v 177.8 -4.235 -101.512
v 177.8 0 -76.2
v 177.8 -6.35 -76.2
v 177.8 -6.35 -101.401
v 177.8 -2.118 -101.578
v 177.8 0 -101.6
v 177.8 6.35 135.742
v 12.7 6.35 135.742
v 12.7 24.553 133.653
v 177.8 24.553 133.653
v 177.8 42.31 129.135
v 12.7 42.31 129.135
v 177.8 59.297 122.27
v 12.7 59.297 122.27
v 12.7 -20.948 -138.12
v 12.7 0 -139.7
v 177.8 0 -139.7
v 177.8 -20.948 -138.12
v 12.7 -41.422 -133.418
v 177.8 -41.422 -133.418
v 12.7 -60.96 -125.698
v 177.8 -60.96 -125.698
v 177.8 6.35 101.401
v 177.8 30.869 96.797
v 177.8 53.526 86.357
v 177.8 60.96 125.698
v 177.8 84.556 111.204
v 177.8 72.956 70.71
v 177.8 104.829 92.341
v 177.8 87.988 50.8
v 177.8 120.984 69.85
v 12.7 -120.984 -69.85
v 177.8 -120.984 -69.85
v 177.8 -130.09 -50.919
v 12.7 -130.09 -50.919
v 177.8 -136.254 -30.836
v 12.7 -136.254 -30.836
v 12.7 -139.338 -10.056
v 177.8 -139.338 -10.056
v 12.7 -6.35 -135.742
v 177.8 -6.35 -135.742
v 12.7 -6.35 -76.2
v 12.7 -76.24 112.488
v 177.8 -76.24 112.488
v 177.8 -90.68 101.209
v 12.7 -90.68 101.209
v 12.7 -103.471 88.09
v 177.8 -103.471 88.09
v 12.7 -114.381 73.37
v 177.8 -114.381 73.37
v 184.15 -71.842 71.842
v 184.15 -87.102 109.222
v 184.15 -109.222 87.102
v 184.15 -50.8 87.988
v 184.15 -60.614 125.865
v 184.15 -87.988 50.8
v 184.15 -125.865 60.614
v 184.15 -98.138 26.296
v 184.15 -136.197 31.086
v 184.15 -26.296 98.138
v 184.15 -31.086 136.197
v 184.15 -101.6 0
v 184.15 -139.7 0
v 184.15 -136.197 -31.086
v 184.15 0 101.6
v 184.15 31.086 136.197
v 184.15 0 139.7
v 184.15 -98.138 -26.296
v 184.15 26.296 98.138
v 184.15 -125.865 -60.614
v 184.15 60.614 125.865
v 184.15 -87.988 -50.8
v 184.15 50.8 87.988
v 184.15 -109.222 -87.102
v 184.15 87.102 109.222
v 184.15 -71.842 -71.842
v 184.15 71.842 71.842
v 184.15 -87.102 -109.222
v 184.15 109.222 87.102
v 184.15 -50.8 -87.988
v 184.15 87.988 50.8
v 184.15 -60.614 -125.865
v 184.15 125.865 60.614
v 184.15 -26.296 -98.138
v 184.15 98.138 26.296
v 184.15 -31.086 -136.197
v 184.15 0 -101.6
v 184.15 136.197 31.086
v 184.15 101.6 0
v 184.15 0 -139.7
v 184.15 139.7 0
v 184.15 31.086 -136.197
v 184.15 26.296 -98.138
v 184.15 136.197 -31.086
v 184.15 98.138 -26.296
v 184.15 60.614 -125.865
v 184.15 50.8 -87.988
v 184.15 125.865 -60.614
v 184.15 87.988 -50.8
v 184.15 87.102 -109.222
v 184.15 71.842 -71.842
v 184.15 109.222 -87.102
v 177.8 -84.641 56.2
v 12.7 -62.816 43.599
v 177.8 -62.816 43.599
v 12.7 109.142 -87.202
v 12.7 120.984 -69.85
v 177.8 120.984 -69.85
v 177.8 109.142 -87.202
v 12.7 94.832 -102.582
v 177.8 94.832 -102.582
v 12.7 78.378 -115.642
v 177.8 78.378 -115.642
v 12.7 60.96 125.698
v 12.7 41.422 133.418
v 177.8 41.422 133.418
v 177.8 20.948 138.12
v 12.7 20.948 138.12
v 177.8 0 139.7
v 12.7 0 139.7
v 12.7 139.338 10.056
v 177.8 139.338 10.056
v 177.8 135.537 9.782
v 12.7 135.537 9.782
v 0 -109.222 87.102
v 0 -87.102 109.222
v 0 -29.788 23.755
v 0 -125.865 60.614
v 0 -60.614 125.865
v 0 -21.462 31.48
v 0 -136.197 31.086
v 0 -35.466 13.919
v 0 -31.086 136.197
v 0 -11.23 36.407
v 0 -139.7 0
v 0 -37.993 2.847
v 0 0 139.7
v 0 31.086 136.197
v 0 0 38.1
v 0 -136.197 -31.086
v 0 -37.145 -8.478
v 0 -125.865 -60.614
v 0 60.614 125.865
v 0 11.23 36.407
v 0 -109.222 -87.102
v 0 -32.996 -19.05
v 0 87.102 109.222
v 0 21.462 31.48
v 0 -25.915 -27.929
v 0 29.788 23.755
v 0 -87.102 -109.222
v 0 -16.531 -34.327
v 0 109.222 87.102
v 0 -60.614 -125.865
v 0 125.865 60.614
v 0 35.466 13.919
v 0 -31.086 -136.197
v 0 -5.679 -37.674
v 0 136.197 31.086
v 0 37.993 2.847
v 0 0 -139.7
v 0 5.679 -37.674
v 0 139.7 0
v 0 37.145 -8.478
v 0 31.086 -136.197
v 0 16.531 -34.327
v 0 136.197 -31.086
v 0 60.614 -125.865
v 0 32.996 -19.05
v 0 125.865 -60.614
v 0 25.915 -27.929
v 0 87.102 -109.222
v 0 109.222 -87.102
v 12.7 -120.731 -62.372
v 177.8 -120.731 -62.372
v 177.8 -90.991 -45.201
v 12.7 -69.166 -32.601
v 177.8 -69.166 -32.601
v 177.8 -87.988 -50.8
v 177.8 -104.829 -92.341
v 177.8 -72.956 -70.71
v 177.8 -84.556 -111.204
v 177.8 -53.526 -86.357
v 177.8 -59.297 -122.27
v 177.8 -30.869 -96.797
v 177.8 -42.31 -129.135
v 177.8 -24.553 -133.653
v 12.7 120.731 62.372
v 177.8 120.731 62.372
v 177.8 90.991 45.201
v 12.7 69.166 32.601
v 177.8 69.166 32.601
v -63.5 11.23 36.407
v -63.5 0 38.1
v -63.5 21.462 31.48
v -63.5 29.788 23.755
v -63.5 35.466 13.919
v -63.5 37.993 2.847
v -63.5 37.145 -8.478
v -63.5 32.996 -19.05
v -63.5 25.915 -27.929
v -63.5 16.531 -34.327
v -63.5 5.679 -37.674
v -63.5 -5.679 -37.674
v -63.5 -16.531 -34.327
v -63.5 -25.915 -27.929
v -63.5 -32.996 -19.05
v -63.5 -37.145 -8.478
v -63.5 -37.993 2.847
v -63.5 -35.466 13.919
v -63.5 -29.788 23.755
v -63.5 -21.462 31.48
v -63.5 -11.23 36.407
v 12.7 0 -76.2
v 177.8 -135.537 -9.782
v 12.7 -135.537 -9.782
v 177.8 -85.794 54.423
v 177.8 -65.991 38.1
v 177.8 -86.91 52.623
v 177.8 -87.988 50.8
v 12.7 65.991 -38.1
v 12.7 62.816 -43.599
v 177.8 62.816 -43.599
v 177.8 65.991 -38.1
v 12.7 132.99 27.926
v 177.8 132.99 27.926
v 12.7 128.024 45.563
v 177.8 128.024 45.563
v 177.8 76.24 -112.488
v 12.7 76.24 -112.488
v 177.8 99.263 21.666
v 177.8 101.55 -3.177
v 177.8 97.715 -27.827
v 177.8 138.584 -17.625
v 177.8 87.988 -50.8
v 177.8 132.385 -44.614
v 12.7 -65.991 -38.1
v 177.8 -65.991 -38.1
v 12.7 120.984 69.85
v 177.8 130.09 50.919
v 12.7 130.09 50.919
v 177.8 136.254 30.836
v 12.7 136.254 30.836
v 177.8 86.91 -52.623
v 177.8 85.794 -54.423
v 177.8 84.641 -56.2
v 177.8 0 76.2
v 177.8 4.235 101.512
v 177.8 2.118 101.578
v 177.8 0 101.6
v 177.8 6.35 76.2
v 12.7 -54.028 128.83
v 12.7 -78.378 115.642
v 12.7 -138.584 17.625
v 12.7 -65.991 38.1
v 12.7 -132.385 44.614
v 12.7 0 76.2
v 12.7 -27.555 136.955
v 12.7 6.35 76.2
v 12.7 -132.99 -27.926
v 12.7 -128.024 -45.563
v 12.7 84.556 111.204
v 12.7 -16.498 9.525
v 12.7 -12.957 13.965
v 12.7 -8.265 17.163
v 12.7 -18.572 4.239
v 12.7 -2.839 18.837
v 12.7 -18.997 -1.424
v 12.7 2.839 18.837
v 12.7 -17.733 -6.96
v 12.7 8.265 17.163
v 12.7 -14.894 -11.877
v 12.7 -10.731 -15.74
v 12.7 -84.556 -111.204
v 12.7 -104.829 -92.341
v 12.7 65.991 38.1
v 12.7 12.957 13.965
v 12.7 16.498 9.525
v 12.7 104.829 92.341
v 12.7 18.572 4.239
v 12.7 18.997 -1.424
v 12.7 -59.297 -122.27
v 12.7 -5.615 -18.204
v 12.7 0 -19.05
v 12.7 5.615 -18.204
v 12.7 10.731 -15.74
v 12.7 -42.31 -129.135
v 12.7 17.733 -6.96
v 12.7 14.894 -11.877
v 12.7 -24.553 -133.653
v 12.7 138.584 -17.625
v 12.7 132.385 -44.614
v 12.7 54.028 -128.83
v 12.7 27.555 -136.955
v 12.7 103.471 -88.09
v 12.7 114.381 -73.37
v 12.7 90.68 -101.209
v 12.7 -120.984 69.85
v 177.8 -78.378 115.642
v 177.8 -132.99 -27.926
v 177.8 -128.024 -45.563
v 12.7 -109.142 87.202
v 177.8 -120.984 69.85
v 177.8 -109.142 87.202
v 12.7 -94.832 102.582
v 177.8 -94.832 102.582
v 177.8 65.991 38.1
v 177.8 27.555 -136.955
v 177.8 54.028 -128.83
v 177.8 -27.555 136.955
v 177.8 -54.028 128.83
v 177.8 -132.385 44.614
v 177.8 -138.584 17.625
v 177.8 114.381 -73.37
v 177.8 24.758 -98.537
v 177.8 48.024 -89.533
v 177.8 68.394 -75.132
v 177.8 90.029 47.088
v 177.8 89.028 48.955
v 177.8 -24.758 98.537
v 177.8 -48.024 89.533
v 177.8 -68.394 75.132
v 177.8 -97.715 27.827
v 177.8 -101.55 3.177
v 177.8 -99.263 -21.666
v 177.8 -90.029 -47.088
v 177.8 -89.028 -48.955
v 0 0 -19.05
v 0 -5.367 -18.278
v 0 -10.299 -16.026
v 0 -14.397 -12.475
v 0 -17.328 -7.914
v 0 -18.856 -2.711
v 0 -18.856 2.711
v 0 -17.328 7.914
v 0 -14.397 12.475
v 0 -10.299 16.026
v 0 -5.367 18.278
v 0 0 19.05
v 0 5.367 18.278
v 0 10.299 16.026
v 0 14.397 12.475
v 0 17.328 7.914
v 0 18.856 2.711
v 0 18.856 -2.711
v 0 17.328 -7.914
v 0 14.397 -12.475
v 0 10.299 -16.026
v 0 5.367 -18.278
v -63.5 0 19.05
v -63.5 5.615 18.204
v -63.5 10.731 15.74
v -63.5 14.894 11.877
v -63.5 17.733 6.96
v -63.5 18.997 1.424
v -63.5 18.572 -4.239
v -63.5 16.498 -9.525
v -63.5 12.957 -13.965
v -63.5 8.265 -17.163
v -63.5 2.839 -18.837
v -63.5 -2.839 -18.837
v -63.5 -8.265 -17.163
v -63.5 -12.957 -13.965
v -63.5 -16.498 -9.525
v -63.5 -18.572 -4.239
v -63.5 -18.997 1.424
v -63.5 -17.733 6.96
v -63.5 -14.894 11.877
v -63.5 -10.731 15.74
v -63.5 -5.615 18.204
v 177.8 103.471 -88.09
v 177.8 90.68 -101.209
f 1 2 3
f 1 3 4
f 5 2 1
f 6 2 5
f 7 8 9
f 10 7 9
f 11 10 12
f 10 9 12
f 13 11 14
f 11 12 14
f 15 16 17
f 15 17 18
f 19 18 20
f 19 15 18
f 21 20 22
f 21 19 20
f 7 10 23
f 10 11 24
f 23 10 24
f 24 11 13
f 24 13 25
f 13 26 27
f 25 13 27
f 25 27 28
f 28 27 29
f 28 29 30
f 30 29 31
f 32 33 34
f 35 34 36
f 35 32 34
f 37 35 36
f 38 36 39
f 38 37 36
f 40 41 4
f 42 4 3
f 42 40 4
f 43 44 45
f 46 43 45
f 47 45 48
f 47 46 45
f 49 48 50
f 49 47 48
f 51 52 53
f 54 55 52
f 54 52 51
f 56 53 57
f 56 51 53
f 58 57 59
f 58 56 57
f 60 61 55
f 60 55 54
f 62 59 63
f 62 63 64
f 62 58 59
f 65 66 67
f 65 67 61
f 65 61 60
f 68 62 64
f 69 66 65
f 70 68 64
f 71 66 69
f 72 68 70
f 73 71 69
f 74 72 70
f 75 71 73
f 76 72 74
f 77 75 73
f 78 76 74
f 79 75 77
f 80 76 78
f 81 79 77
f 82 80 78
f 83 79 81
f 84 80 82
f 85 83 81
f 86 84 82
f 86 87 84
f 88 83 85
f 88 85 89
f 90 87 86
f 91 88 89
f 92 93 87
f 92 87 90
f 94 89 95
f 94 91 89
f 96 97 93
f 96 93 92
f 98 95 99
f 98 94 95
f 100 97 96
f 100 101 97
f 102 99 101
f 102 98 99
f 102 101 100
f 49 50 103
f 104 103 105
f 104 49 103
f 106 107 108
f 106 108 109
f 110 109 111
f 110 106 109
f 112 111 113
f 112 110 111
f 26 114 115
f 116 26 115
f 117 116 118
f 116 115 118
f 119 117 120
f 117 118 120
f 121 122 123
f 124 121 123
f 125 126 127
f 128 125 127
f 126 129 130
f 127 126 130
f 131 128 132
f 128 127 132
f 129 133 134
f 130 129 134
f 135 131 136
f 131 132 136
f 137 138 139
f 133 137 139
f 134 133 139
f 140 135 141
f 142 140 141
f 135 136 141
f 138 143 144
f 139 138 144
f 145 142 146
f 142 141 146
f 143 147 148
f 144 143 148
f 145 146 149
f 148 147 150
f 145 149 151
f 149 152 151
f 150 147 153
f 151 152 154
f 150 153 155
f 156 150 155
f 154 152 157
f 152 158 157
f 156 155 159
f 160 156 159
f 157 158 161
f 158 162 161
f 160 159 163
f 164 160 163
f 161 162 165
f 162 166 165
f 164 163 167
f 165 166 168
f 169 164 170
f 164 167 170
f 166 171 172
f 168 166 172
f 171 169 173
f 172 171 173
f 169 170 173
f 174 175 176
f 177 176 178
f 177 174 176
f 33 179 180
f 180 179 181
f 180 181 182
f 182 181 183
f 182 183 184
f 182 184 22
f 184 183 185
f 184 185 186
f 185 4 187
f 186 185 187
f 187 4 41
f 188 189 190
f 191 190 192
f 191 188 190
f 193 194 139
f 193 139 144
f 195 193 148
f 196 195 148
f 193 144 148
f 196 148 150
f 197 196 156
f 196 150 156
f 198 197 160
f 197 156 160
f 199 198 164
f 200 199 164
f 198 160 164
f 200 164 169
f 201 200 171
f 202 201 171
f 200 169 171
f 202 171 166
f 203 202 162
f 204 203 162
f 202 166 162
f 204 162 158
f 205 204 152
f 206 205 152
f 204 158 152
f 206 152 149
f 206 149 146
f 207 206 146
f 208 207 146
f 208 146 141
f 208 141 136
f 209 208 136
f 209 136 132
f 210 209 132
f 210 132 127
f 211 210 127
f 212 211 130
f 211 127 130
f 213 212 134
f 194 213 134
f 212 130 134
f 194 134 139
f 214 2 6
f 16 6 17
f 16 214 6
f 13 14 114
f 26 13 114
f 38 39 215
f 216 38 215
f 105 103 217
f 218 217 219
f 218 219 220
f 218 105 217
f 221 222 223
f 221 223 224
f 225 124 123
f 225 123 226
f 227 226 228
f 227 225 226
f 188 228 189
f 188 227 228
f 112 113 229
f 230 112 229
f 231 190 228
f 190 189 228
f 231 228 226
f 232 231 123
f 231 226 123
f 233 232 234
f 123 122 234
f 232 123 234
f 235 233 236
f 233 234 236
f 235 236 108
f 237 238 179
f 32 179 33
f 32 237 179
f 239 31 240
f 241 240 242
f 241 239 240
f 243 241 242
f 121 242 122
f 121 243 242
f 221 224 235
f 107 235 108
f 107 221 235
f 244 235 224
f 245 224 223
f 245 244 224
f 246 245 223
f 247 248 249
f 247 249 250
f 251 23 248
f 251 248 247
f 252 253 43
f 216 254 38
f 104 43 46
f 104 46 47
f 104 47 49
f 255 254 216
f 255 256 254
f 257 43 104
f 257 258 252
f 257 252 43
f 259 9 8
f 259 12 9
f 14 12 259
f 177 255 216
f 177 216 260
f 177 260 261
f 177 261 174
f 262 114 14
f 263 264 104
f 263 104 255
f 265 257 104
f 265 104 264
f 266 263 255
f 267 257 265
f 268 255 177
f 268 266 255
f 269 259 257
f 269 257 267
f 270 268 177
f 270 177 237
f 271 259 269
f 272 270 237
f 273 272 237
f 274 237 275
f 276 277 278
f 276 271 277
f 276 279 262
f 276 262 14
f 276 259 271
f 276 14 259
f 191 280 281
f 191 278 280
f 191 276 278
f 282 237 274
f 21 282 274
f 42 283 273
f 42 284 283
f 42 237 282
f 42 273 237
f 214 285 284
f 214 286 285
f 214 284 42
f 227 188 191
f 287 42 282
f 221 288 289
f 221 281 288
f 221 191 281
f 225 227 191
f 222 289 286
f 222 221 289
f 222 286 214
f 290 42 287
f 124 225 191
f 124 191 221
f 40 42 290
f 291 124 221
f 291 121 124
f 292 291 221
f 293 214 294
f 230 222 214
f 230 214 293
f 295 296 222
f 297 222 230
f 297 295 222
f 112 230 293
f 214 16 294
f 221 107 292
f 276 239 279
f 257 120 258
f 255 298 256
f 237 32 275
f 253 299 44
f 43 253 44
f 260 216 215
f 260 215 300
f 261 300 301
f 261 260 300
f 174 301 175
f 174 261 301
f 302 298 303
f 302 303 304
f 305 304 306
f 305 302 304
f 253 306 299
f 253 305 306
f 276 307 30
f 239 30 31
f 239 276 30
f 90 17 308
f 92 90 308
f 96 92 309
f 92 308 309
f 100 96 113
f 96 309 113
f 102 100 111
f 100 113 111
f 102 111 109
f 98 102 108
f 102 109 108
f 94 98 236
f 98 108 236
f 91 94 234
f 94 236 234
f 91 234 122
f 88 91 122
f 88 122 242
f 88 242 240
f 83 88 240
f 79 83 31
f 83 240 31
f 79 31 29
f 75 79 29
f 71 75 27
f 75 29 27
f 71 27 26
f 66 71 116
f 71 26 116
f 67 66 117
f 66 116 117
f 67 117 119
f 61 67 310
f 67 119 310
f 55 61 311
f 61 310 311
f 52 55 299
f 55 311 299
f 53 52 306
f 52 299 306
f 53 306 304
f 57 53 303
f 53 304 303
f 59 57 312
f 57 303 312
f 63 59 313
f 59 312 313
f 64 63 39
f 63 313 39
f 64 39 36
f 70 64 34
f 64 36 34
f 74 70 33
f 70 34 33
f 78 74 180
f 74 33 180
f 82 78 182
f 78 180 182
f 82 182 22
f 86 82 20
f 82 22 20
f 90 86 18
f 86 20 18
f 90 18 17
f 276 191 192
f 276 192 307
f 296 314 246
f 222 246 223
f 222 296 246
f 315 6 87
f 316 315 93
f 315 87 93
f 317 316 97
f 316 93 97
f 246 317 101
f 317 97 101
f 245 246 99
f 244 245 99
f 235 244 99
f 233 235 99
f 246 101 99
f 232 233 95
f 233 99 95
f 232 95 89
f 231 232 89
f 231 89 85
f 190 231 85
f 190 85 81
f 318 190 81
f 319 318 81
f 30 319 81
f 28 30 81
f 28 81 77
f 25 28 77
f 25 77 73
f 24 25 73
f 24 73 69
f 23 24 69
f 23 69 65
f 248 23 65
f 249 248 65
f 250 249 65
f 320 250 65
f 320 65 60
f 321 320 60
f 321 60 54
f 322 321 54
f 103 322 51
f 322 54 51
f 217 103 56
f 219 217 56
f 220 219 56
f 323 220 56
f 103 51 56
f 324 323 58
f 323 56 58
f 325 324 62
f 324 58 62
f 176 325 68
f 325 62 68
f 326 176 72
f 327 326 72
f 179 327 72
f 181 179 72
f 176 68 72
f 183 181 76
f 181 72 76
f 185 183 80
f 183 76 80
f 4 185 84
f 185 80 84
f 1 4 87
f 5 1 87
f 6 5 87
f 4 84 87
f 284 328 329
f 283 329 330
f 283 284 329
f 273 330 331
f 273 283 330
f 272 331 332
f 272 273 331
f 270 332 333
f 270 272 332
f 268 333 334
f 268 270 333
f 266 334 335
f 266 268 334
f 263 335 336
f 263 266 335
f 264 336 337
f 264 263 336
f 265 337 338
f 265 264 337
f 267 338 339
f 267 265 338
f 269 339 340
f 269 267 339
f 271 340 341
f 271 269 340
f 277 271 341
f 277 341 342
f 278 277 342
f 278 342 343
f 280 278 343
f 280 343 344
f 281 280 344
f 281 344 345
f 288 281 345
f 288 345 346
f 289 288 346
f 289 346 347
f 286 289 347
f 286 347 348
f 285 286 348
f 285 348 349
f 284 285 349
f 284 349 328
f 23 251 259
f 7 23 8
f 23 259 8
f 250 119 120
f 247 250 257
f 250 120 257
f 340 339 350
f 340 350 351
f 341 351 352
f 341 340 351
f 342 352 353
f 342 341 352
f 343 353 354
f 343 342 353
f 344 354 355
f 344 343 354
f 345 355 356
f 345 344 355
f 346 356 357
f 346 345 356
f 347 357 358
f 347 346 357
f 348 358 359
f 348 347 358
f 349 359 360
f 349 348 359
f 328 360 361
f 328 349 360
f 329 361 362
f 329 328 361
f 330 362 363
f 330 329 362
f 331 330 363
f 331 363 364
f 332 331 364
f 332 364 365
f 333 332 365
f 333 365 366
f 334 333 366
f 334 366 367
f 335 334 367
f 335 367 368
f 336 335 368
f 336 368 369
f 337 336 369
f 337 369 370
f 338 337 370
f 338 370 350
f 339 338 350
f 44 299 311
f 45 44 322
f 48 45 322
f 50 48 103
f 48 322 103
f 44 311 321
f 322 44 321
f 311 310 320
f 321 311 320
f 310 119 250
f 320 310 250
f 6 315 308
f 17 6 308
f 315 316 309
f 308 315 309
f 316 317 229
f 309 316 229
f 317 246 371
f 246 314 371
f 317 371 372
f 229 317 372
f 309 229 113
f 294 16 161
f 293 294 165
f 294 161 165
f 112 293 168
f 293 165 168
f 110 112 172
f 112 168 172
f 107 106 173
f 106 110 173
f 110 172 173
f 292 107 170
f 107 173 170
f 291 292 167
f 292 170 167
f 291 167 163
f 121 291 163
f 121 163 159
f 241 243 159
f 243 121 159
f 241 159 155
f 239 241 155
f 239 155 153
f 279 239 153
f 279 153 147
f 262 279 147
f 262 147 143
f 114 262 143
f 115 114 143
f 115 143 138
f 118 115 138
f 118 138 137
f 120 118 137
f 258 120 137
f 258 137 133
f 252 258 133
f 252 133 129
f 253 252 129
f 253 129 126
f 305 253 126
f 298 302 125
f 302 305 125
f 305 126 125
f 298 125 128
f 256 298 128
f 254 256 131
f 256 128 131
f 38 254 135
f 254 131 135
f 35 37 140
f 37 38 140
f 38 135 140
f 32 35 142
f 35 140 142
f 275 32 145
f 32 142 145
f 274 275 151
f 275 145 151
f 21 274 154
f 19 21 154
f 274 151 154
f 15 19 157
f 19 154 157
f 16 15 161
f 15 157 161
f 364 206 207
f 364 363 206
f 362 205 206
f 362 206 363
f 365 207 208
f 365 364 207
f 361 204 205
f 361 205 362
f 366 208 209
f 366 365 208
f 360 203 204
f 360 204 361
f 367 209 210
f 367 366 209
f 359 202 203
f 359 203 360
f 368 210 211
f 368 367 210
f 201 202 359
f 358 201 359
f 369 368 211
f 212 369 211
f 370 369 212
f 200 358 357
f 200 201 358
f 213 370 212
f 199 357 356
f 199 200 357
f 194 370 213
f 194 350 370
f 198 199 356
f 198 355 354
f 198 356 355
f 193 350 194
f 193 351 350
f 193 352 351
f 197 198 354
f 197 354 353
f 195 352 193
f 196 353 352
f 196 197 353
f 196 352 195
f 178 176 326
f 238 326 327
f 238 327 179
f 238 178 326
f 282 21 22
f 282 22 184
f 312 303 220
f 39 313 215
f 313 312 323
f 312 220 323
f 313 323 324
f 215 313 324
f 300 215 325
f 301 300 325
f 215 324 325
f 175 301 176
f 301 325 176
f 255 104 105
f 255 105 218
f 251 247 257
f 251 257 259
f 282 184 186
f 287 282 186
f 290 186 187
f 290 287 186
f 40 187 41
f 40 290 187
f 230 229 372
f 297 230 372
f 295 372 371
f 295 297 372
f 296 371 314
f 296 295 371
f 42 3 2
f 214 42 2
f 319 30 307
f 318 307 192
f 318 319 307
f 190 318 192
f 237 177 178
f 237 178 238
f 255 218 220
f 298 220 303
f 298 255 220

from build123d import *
from build123d.topology import SkipClean

# Parameters (mm, degrees)
SKETCH5_R           = 139.7
BOSS_EXTRUDE3_DEPTH = 12.7
SKETCH6_R           = 38.1
SKETCH6_R_2         = 19.05
BOSS_EXTRUDE4_DEPTH = 63.5
CUT_EXTRUDE3_START  = -63.5
SKETCH7_R           = 19.05
CUT_EXTRUDE3_DEPTH  = 63.5
BOSS_EXTRUDE5_DEPTH = 165.1
SKETCH10_R          = 139.7
BOSS_EXTRUDE6_DEPTH = 6.35
SKETCH11_R          = 101.6
CUT_EXTRUDE4_DEPTH  = 6.35


with BuildPart() as part:
    # Sketch5 → Boss-Extrude3 (new body)
    with BuildSketch(Plane(origin=(0, 0, 0), x_dir=(0, 0, -1), z_dir=(1, 0, 0))):
        Circle(SKETCH5_R)
    extrude(amount=BOSS_EXTRUDE3_DEPTH)

    # Sketch6 → Boss-Extrude4 (add)
    with BuildSketch(Plane.ZY):
        Circle(SKETCH6_R)
        Circle(SKETCH6_R_2, mode=Mode.SUBTRACT)
    extrude(amount=BOSS_EXTRUDE4_DEPTH)

    # Sketch7 → Cut-Extrude3 (cut)
    with BuildSketch(Plane.ZY.offset(CUT_EXTRUDE3_START)):
        with Locations(Location((0, 0, 0), (0, 0, 180))):
            Circle(SKETCH7_R)
    extrude(amount=CUT_EXTRUDE3_DEPTH, mode=Mode.SUBTRACT)

    # Sketch9 → Boss-Extrude5 (add)
    with SkipClean():  # the faces are left unmerged after this step: merging them gives an invalid solid
        with BuildSketch(Plane(origin=(12.7, 0, 0), x_dir=(0, 0, -1), z_dir=(1, 0, 0))):
            with BuildLine():
                Line((-139.7, 0), (-76.2, 0))
                Line((-76.2, 0), (-76.2, 6.35))
                Line((-76.2, 6.35), (-135.741554433, 6.35))
                ThreePointArc((-135.741554433, 6.35), (-131.694050685, 33.507747077), (-122.269799969, 59.297454545))
                Line((-122.269799969, 59.297454545), (-125.697925202, 60.96))
                ThreePointArc((-125.697925202, 60.96), (-136.154489736, 31.2737098), (-139.7, 0))
            make_face()
            with BuildLine():
                Line((-115.641871216, -78.377596428), (-112.488002001, -76.240025616))
                ThreePointArc((-112.488002001, -76.240025616), (-94.865585535, -97.296519882), (-73.370038531, -114.380634489))
                Line((-73.370038531, -114.380634489), (-43.599261314, -62.816135768))
                Line((-43.599261314, -62.816135768), (-38.1, -65.991135768))
                Line((-38.1, -65.991135768), (-69.85, -120.983748909))
                ThreePointArc((-69.85, -120.983748909), (-95.161072026, -102.276392051), (-115.641871216, -78.377596428))
            make_face()
            with BuildLine():
                Line((10.056053986, -139.337596428), (9.781797968, -135.537480161))
                ThreePointArc((9.781797968, -135.537480161), (36.82846515, -130.804266959), (62.371515903, -120.730634489))
                Line((62.371515903, -120.730634489), (32.600738686, -69.166135768))
                Line((32.600738686, -69.166135768), (38.1, -65.991135768))
                Line((38.1, -65.991135768), (69.85, -120.983748909))
                ThreePointArc((69.85, -120.983748909), (40.993417711, -133.550101851), (10.056053986, -139.337596428))
            make_face()
            with BuildLine():
                Line((125.697925202, -60.96), (122.269799969, -59.297454545))
                ThreePointArc((122.269799969, -59.297454545), (131.694050685, -33.507747077), (135.741554433, -6.35))
                Line((135.741554433, -6.35), (76.2, -6.35))
                Line((76.2, -6.35), (76.2, 0))
                Line((76.2, 0), (139.7, 0))
                ThreePointArc((139.7, 0), (136.154489736, -31.2737098), (125.697925202, -60.96))
            make_face()
            with BuildLine():
                Line((115.641871216, 78.377596428), (112.488002001, 76.240025616))
                ThreePointArc((112.488002001, 76.240025616), (94.865585535, 97.296519882), (73.370038531, 114.380634489))
                Line((73.370038531, 114.380634489), (43.599261314, 62.816135768))
                Line((43.599261314, 62.816135768), (38.1, 65.991135768))
                Line((38.1, 65.991135768), (69.85, 120.983748909))
                ThreePointArc((69.85, 120.983748909), (95.161072026, 102.276392051), (115.641871216, 78.377596428))
            make_face()
            with BuildLine():
                Line((-10.056053986, 139.337596428), (-9.781797968, 135.537480161))
                ThreePointArc((-9.781797968, 135.537480161), (-36.82846515, 130.804266959), (-62.371515903, 120.730634489))
                Line((-62.371515903, 120.730634489), (-32.600738686, 69.166135768))
                Line((-32.600738686, 69.166135768), (-38.1, 65.991135768))
                Line((-38.1, 65.991135768), (-69.85, 120.983748909))
                ThreePointArc((-69.85, 120.983748909), (-40.993417711, 133.550101851), (-10.056053986, 139.337596428))
            make_face()
        extrude(amount=BOSS_EXTRUDE5_DEPTH)

    # Sketch10 → Boss-Extrude6 (add)
    with SkipClean():  # the faces are left unmerged after this step: merging them gives an invalid solid
        with BuildSketch(Plane(origin=(177.8, 0, 0), x_dir=(0, 0, -1), z_dir=(1, 0, 0))):
            Circle(SKETCH10_R)
        extrude(amount=BOSS_EXTRUDE6_DEPTH)

    # Sketch11 → Cut-Extrude4 (cut)
    with SkipClean():  # the faces are left unmerged after this step: merging them gives an invalid solid
        with BuildSketch(Plane(origin=(184.15, 0, 0), x_dir=(0, 0, -1), z_dir=(1, 0, 0))):
            Circle(SKETCH11_R)
        extrude(amount=-CUT_EXTRUDE4_DEPTH, mode=Mode.SUBTRACT)


solid = part.part
